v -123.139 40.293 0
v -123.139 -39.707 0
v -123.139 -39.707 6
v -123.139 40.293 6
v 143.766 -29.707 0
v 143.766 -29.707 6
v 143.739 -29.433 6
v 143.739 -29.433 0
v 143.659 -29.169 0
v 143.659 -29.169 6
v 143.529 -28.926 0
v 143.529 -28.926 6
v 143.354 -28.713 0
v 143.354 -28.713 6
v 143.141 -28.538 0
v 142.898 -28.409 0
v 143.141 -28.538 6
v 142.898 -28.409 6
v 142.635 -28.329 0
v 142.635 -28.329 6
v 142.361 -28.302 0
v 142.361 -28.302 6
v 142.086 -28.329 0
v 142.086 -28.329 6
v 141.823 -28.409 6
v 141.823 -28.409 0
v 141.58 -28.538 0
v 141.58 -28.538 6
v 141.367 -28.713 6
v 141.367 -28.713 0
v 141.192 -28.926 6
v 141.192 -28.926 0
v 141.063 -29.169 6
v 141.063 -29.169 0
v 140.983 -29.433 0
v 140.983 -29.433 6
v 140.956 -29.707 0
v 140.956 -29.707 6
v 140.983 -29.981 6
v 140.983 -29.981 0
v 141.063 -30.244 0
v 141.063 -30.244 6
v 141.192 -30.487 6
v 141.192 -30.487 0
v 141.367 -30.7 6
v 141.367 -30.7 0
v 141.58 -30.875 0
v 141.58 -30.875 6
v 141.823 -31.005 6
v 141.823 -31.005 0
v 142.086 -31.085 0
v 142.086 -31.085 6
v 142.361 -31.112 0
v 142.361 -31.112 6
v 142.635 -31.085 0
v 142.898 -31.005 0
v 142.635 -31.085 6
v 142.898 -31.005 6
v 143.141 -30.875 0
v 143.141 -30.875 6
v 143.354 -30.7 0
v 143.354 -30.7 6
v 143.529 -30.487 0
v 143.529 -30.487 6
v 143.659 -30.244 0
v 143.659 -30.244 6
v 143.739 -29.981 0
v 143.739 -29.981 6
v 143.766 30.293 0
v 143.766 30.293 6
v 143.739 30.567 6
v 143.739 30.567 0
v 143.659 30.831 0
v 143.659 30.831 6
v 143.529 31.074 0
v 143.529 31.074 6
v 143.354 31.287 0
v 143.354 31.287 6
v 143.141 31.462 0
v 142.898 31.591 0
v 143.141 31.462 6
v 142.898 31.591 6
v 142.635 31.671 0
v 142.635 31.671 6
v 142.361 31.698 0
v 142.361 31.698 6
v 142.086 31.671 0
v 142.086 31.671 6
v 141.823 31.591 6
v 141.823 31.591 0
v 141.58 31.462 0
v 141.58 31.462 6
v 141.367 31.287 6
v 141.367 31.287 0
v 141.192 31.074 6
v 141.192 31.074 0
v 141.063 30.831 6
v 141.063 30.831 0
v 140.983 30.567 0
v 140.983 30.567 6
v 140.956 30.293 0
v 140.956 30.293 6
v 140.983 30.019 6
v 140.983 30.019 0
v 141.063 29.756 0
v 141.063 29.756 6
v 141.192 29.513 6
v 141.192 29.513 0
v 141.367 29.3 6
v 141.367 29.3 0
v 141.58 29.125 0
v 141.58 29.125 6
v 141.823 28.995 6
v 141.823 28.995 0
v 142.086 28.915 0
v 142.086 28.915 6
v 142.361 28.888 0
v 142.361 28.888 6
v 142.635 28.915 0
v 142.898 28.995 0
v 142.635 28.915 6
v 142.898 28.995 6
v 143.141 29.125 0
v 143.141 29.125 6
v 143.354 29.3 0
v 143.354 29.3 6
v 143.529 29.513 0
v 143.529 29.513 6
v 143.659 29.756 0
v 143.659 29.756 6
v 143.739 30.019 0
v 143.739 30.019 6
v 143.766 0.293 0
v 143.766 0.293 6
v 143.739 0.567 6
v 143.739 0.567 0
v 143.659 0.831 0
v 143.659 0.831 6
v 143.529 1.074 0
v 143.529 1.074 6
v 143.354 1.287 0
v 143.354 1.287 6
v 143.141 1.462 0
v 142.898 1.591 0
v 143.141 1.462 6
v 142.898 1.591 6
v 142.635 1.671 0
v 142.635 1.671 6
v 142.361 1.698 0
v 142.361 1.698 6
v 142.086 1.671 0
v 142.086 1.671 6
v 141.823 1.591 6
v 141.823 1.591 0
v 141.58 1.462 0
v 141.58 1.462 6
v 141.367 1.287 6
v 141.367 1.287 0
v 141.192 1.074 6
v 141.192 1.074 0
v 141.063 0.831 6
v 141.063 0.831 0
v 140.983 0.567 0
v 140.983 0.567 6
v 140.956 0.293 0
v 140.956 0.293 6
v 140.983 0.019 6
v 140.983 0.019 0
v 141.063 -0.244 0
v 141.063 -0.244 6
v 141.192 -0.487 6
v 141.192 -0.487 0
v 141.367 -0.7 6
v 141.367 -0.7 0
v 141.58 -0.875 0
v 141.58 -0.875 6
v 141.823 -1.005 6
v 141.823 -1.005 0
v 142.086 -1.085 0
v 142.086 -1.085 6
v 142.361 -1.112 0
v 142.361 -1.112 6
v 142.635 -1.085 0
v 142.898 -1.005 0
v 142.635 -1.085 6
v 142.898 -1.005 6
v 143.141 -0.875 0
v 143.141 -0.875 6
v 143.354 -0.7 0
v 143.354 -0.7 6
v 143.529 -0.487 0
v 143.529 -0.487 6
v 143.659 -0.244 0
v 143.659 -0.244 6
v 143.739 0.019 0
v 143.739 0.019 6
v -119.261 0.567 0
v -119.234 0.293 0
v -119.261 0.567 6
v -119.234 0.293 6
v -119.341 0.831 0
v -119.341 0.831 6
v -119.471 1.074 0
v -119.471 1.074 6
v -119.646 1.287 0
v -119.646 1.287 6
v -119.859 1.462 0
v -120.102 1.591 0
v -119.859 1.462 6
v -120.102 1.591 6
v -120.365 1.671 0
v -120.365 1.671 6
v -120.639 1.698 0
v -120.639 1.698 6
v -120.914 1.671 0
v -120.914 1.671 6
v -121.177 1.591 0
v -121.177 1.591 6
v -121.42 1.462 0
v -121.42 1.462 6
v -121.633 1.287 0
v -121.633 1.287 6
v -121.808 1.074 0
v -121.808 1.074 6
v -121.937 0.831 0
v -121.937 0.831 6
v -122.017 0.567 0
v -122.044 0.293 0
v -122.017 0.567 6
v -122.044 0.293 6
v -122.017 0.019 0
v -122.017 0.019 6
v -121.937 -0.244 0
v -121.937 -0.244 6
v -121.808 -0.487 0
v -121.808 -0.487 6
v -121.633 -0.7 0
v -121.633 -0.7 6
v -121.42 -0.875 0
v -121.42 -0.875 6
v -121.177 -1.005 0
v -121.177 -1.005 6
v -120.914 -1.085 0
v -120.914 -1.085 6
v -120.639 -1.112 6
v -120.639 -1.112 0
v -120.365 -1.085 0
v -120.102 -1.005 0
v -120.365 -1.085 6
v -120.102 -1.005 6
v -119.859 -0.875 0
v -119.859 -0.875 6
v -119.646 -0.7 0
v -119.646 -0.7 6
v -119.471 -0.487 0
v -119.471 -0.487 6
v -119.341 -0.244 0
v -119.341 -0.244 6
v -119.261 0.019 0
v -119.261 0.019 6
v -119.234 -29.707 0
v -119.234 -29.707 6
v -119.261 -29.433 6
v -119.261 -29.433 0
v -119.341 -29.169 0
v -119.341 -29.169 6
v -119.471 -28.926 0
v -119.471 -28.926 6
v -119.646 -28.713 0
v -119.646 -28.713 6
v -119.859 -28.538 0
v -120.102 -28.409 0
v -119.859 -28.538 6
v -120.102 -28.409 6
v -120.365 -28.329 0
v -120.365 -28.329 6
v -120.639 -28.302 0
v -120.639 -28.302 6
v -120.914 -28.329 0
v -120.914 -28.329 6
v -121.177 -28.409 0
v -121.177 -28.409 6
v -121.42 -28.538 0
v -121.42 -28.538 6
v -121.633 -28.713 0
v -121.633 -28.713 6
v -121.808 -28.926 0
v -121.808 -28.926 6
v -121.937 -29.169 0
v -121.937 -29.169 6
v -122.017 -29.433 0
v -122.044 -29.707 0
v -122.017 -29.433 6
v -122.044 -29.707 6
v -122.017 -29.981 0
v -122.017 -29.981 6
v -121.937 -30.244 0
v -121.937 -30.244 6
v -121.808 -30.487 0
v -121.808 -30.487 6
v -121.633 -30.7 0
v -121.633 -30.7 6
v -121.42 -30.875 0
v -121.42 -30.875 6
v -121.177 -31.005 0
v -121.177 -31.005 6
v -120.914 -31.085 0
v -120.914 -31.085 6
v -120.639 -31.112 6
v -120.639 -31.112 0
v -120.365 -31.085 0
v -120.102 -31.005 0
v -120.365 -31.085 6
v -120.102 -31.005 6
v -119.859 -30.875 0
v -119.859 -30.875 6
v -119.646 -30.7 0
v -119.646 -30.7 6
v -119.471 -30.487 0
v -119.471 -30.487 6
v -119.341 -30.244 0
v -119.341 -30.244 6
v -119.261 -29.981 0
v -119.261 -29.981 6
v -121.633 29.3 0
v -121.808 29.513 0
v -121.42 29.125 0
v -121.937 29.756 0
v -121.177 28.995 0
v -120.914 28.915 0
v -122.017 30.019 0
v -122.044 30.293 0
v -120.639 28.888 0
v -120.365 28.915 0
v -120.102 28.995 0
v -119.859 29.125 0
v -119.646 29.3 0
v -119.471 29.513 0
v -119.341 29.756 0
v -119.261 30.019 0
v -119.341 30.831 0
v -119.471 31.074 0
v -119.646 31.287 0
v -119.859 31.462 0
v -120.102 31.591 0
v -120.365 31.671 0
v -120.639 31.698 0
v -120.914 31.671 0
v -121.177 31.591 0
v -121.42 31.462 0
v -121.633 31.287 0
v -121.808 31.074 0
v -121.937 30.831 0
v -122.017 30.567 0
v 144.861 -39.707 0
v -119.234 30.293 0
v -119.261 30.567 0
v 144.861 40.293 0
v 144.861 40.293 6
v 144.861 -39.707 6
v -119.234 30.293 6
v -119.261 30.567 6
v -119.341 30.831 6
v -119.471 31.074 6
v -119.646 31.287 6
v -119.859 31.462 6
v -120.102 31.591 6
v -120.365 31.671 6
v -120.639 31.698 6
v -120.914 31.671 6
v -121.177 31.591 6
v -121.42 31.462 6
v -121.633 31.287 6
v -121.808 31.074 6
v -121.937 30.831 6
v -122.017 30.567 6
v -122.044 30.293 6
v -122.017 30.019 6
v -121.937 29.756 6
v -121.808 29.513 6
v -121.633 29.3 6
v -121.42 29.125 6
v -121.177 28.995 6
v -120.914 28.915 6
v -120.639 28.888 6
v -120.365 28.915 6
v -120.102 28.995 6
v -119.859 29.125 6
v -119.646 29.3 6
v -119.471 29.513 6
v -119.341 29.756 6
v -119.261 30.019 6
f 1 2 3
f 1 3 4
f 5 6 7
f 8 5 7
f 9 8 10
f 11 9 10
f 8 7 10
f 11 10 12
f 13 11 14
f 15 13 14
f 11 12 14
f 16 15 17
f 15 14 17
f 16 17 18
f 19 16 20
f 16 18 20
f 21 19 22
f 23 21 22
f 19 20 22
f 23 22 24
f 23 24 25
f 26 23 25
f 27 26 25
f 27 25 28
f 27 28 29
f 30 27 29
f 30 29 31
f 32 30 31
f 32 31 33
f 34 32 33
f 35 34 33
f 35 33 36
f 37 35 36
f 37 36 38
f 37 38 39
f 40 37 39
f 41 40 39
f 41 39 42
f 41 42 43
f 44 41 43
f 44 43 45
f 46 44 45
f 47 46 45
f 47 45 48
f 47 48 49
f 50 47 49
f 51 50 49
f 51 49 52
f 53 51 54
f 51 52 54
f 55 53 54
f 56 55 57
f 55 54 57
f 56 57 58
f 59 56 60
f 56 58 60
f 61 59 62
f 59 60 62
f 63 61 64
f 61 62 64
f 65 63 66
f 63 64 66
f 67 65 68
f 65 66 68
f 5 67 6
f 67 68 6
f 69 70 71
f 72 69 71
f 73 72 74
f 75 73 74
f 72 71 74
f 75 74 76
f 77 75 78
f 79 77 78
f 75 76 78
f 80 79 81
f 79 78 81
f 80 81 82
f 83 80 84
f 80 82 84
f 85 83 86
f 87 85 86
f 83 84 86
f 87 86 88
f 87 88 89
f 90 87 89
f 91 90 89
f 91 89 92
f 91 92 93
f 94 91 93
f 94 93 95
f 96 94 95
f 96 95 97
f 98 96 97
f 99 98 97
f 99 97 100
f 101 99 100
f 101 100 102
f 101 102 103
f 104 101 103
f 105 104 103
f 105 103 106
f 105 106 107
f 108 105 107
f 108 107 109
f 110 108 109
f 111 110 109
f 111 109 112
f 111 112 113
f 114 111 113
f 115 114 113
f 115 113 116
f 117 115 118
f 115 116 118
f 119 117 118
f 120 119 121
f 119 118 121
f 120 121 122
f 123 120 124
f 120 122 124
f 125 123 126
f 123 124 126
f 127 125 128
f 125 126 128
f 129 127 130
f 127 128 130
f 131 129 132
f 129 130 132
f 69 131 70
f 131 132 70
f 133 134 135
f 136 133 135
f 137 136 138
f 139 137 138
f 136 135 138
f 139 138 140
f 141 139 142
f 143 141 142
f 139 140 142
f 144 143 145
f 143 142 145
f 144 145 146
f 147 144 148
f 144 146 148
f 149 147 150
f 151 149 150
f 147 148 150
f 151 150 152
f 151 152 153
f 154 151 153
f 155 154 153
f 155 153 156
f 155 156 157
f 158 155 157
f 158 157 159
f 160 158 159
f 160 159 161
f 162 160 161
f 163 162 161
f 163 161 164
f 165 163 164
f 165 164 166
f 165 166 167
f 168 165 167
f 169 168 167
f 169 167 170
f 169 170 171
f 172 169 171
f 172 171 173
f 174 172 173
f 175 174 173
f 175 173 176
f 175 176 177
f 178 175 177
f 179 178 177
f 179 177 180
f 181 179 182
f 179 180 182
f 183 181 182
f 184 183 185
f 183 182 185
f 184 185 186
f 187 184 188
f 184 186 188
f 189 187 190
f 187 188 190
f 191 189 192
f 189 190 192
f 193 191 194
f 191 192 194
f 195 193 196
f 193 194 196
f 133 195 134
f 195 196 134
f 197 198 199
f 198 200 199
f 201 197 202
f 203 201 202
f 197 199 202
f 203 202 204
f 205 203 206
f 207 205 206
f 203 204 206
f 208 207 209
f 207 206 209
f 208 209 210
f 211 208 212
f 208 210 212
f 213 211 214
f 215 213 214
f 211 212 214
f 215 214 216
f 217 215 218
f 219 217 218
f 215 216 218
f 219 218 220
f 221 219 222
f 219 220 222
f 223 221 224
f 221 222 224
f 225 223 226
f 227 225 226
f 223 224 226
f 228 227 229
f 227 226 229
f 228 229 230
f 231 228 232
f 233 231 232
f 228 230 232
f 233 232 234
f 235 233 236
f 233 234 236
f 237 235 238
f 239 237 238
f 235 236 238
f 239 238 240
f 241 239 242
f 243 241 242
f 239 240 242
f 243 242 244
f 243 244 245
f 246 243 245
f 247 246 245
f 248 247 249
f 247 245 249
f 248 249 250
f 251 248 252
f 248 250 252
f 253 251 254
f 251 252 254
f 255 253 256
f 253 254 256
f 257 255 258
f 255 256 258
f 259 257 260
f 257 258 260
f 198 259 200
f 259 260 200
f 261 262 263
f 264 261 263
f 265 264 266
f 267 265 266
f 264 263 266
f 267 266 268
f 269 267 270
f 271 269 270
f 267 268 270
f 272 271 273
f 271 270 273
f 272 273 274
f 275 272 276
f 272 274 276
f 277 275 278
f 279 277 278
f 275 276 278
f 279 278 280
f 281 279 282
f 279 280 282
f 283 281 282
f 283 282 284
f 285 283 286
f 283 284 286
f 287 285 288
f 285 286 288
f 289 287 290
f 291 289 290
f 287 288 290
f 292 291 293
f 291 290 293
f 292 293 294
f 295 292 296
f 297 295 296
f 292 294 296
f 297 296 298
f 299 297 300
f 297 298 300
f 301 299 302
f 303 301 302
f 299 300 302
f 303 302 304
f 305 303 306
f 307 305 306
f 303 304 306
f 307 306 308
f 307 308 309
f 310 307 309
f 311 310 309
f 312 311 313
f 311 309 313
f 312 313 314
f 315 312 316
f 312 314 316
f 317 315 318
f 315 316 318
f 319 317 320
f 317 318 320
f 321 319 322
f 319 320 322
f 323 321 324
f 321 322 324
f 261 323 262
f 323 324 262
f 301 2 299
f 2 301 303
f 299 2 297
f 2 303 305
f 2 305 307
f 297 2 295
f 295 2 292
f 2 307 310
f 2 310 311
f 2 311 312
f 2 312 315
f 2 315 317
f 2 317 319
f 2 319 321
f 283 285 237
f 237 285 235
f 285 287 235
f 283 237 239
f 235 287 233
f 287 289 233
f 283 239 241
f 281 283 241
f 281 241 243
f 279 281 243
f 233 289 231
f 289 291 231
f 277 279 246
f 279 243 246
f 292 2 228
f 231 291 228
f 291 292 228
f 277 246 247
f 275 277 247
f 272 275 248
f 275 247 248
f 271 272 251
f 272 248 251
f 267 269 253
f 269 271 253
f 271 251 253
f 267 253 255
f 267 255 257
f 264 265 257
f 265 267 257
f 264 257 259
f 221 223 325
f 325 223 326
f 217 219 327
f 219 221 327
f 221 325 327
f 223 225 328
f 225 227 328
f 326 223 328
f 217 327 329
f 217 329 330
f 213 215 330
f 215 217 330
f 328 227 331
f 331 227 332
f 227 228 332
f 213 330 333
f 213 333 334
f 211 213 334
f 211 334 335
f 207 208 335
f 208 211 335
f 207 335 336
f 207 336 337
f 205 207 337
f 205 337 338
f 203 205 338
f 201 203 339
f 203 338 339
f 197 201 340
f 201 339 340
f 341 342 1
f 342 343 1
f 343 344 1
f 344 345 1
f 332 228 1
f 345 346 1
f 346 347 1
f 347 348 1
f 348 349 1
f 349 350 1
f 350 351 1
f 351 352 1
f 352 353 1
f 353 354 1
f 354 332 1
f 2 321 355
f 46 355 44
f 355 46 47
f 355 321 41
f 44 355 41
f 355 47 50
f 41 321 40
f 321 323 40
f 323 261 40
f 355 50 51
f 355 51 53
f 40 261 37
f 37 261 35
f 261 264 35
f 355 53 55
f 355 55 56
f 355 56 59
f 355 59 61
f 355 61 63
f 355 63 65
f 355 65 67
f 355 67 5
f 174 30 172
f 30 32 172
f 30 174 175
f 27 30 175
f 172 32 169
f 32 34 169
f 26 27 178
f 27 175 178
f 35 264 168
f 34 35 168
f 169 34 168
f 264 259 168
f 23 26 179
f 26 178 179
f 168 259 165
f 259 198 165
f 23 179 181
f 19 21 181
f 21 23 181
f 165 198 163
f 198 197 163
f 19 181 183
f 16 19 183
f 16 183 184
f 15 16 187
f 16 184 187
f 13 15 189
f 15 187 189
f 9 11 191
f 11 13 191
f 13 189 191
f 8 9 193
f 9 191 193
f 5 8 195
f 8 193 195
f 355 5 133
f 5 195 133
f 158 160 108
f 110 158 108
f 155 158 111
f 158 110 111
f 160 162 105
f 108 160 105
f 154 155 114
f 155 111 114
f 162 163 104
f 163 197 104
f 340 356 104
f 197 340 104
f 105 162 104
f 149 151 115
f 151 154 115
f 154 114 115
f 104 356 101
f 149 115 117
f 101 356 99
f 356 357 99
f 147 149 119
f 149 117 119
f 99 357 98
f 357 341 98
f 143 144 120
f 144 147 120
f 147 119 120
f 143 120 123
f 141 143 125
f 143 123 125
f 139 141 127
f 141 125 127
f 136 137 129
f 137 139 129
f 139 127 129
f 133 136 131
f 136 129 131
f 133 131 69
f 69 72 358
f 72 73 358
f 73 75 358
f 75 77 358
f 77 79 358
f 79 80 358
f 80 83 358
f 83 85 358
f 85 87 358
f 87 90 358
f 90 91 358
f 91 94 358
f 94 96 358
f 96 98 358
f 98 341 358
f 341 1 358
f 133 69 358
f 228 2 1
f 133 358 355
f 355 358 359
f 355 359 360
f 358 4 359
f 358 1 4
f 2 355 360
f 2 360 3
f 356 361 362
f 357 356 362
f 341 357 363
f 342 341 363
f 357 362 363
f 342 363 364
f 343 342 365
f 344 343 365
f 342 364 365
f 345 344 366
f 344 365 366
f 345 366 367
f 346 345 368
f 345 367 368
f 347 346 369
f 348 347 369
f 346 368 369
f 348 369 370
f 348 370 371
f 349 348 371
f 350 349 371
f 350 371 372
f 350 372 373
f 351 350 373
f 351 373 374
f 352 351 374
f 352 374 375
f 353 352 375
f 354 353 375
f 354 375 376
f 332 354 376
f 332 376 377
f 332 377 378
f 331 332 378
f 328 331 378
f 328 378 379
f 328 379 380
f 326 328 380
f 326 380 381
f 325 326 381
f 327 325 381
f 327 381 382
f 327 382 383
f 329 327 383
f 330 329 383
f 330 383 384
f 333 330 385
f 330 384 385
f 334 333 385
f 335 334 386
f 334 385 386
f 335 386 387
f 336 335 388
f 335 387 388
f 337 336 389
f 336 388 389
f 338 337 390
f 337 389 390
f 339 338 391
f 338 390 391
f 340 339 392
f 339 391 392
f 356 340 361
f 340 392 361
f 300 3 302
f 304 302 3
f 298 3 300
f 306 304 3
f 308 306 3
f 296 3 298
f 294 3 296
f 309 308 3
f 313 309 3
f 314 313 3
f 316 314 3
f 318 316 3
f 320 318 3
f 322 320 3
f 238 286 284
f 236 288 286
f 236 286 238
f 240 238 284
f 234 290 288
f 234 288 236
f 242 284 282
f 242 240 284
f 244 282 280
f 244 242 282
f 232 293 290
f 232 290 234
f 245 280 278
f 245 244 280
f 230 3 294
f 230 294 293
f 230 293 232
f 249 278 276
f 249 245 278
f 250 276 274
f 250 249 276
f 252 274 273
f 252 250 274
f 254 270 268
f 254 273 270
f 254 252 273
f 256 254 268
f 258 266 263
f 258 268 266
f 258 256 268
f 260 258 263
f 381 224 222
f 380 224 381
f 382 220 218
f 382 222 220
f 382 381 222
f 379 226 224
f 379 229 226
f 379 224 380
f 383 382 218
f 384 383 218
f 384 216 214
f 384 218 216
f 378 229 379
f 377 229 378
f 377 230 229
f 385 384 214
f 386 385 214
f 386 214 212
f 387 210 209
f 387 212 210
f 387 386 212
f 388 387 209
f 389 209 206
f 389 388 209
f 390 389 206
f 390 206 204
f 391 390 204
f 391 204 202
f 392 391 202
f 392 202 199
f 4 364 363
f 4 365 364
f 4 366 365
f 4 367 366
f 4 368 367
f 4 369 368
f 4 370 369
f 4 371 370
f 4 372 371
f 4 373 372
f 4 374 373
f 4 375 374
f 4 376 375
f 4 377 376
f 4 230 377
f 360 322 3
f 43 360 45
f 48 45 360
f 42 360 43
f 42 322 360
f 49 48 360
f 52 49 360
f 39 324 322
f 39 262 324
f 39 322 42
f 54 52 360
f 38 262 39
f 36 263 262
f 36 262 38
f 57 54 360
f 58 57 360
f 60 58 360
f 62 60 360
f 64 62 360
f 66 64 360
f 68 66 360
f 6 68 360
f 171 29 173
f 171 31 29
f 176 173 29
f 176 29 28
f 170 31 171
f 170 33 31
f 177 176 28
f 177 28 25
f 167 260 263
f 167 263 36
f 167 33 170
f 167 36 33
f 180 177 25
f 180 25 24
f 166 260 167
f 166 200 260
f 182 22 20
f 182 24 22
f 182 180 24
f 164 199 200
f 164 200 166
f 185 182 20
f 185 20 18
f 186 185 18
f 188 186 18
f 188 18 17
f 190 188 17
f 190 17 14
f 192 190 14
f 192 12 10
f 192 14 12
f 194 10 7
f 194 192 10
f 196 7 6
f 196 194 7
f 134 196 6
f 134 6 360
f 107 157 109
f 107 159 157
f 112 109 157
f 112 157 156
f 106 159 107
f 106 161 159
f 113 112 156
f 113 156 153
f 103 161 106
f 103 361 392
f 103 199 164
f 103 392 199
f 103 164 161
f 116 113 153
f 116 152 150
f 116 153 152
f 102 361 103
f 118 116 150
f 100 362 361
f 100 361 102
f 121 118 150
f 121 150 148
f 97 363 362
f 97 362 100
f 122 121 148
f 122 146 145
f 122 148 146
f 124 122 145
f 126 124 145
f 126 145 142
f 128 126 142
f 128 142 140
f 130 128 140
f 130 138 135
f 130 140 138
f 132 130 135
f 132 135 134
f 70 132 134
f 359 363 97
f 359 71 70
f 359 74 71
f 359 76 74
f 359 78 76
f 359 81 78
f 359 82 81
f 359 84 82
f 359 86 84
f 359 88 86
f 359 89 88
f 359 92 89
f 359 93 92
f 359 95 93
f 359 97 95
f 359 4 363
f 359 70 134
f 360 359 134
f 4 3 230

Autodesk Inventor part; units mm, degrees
ref_plane "YZ Plane" through (0, 0, 0) normal (1, 0, 0) x (0, 1, 0)
ref_plane "XZ Plane" through (0, 0, 0) normal (0, 1, 0) x (-1, 0, 0)
ref_plane "XY Plane" through (0, 0, 0) normal (0, 0, 1) x (1, 0, 0)
sketch "Sketch1" plane through (0, 0, 0) normal (0, 0, 1) x (1, 0, 0)
  line L0 (-123.1394, 40.2933) -> (144.8606, 40.2933)
  line L1 (144.8606, 40.2933) -> (144.8606, -39.7067)
  line L2 (144.8606, -39.7067) -> (-123.1394, -39.7067)
  line L3 (-123.1394, -39.7067) -> (-123.1394, 40.2933)
  point P0 (0, 0)
  dimension "d0" = 268
  dimension "d1" = 80
extrude "Extrusion1" add sketch "Sketch1" along normal blind 6
sketch "Sketch2" plane through (0, 0, 6) normal (0, 0, 1) x (1, 0, 0)
  circle A0 centre (-120.6394, 30.2933) radius 1.405
  line L0 (-123.1394, 40.2933) -> (-123.1394, -39.7067) projected
  line L1 (144.8606, 40.2933) -> (-123.1394, 40.2933) projected
  point P0 (0, 0)
  dimension "d4" = 2.81
  dimension "d5" = 2.5
  dimension "d6" = 10
extrude "Extrusion2" cut sketch "Sketch2" against normal blind 10
pattern_linear "Rectangular Pattern1" count 3 spacing 30 along (0, -1, 0) count 2 spacing -263 along (-1, 0, 0) of "Extrusion2"
equation "\"d0\" = -2 * CornerOffset + BoxLength - 2 * SheetThickness"
equation "\"d1\" = BoxHeight"
equation "\"d2\" = SheetThickness"
equation "\"d4\" = M3Hole"
equation "\"d5\" = HoleOffset"
equation "\"BoxHeight\" = 80"
equation "\"SheetThickness\" = 6"
equation "\"CornerOffset\" = 5"
equation "\"M3Hole\" = 2.81"
equation "\"HoleOffset\" = 2.5"
equation "\"BoxLength\" = 290"
properties part number "cab_L_B"
